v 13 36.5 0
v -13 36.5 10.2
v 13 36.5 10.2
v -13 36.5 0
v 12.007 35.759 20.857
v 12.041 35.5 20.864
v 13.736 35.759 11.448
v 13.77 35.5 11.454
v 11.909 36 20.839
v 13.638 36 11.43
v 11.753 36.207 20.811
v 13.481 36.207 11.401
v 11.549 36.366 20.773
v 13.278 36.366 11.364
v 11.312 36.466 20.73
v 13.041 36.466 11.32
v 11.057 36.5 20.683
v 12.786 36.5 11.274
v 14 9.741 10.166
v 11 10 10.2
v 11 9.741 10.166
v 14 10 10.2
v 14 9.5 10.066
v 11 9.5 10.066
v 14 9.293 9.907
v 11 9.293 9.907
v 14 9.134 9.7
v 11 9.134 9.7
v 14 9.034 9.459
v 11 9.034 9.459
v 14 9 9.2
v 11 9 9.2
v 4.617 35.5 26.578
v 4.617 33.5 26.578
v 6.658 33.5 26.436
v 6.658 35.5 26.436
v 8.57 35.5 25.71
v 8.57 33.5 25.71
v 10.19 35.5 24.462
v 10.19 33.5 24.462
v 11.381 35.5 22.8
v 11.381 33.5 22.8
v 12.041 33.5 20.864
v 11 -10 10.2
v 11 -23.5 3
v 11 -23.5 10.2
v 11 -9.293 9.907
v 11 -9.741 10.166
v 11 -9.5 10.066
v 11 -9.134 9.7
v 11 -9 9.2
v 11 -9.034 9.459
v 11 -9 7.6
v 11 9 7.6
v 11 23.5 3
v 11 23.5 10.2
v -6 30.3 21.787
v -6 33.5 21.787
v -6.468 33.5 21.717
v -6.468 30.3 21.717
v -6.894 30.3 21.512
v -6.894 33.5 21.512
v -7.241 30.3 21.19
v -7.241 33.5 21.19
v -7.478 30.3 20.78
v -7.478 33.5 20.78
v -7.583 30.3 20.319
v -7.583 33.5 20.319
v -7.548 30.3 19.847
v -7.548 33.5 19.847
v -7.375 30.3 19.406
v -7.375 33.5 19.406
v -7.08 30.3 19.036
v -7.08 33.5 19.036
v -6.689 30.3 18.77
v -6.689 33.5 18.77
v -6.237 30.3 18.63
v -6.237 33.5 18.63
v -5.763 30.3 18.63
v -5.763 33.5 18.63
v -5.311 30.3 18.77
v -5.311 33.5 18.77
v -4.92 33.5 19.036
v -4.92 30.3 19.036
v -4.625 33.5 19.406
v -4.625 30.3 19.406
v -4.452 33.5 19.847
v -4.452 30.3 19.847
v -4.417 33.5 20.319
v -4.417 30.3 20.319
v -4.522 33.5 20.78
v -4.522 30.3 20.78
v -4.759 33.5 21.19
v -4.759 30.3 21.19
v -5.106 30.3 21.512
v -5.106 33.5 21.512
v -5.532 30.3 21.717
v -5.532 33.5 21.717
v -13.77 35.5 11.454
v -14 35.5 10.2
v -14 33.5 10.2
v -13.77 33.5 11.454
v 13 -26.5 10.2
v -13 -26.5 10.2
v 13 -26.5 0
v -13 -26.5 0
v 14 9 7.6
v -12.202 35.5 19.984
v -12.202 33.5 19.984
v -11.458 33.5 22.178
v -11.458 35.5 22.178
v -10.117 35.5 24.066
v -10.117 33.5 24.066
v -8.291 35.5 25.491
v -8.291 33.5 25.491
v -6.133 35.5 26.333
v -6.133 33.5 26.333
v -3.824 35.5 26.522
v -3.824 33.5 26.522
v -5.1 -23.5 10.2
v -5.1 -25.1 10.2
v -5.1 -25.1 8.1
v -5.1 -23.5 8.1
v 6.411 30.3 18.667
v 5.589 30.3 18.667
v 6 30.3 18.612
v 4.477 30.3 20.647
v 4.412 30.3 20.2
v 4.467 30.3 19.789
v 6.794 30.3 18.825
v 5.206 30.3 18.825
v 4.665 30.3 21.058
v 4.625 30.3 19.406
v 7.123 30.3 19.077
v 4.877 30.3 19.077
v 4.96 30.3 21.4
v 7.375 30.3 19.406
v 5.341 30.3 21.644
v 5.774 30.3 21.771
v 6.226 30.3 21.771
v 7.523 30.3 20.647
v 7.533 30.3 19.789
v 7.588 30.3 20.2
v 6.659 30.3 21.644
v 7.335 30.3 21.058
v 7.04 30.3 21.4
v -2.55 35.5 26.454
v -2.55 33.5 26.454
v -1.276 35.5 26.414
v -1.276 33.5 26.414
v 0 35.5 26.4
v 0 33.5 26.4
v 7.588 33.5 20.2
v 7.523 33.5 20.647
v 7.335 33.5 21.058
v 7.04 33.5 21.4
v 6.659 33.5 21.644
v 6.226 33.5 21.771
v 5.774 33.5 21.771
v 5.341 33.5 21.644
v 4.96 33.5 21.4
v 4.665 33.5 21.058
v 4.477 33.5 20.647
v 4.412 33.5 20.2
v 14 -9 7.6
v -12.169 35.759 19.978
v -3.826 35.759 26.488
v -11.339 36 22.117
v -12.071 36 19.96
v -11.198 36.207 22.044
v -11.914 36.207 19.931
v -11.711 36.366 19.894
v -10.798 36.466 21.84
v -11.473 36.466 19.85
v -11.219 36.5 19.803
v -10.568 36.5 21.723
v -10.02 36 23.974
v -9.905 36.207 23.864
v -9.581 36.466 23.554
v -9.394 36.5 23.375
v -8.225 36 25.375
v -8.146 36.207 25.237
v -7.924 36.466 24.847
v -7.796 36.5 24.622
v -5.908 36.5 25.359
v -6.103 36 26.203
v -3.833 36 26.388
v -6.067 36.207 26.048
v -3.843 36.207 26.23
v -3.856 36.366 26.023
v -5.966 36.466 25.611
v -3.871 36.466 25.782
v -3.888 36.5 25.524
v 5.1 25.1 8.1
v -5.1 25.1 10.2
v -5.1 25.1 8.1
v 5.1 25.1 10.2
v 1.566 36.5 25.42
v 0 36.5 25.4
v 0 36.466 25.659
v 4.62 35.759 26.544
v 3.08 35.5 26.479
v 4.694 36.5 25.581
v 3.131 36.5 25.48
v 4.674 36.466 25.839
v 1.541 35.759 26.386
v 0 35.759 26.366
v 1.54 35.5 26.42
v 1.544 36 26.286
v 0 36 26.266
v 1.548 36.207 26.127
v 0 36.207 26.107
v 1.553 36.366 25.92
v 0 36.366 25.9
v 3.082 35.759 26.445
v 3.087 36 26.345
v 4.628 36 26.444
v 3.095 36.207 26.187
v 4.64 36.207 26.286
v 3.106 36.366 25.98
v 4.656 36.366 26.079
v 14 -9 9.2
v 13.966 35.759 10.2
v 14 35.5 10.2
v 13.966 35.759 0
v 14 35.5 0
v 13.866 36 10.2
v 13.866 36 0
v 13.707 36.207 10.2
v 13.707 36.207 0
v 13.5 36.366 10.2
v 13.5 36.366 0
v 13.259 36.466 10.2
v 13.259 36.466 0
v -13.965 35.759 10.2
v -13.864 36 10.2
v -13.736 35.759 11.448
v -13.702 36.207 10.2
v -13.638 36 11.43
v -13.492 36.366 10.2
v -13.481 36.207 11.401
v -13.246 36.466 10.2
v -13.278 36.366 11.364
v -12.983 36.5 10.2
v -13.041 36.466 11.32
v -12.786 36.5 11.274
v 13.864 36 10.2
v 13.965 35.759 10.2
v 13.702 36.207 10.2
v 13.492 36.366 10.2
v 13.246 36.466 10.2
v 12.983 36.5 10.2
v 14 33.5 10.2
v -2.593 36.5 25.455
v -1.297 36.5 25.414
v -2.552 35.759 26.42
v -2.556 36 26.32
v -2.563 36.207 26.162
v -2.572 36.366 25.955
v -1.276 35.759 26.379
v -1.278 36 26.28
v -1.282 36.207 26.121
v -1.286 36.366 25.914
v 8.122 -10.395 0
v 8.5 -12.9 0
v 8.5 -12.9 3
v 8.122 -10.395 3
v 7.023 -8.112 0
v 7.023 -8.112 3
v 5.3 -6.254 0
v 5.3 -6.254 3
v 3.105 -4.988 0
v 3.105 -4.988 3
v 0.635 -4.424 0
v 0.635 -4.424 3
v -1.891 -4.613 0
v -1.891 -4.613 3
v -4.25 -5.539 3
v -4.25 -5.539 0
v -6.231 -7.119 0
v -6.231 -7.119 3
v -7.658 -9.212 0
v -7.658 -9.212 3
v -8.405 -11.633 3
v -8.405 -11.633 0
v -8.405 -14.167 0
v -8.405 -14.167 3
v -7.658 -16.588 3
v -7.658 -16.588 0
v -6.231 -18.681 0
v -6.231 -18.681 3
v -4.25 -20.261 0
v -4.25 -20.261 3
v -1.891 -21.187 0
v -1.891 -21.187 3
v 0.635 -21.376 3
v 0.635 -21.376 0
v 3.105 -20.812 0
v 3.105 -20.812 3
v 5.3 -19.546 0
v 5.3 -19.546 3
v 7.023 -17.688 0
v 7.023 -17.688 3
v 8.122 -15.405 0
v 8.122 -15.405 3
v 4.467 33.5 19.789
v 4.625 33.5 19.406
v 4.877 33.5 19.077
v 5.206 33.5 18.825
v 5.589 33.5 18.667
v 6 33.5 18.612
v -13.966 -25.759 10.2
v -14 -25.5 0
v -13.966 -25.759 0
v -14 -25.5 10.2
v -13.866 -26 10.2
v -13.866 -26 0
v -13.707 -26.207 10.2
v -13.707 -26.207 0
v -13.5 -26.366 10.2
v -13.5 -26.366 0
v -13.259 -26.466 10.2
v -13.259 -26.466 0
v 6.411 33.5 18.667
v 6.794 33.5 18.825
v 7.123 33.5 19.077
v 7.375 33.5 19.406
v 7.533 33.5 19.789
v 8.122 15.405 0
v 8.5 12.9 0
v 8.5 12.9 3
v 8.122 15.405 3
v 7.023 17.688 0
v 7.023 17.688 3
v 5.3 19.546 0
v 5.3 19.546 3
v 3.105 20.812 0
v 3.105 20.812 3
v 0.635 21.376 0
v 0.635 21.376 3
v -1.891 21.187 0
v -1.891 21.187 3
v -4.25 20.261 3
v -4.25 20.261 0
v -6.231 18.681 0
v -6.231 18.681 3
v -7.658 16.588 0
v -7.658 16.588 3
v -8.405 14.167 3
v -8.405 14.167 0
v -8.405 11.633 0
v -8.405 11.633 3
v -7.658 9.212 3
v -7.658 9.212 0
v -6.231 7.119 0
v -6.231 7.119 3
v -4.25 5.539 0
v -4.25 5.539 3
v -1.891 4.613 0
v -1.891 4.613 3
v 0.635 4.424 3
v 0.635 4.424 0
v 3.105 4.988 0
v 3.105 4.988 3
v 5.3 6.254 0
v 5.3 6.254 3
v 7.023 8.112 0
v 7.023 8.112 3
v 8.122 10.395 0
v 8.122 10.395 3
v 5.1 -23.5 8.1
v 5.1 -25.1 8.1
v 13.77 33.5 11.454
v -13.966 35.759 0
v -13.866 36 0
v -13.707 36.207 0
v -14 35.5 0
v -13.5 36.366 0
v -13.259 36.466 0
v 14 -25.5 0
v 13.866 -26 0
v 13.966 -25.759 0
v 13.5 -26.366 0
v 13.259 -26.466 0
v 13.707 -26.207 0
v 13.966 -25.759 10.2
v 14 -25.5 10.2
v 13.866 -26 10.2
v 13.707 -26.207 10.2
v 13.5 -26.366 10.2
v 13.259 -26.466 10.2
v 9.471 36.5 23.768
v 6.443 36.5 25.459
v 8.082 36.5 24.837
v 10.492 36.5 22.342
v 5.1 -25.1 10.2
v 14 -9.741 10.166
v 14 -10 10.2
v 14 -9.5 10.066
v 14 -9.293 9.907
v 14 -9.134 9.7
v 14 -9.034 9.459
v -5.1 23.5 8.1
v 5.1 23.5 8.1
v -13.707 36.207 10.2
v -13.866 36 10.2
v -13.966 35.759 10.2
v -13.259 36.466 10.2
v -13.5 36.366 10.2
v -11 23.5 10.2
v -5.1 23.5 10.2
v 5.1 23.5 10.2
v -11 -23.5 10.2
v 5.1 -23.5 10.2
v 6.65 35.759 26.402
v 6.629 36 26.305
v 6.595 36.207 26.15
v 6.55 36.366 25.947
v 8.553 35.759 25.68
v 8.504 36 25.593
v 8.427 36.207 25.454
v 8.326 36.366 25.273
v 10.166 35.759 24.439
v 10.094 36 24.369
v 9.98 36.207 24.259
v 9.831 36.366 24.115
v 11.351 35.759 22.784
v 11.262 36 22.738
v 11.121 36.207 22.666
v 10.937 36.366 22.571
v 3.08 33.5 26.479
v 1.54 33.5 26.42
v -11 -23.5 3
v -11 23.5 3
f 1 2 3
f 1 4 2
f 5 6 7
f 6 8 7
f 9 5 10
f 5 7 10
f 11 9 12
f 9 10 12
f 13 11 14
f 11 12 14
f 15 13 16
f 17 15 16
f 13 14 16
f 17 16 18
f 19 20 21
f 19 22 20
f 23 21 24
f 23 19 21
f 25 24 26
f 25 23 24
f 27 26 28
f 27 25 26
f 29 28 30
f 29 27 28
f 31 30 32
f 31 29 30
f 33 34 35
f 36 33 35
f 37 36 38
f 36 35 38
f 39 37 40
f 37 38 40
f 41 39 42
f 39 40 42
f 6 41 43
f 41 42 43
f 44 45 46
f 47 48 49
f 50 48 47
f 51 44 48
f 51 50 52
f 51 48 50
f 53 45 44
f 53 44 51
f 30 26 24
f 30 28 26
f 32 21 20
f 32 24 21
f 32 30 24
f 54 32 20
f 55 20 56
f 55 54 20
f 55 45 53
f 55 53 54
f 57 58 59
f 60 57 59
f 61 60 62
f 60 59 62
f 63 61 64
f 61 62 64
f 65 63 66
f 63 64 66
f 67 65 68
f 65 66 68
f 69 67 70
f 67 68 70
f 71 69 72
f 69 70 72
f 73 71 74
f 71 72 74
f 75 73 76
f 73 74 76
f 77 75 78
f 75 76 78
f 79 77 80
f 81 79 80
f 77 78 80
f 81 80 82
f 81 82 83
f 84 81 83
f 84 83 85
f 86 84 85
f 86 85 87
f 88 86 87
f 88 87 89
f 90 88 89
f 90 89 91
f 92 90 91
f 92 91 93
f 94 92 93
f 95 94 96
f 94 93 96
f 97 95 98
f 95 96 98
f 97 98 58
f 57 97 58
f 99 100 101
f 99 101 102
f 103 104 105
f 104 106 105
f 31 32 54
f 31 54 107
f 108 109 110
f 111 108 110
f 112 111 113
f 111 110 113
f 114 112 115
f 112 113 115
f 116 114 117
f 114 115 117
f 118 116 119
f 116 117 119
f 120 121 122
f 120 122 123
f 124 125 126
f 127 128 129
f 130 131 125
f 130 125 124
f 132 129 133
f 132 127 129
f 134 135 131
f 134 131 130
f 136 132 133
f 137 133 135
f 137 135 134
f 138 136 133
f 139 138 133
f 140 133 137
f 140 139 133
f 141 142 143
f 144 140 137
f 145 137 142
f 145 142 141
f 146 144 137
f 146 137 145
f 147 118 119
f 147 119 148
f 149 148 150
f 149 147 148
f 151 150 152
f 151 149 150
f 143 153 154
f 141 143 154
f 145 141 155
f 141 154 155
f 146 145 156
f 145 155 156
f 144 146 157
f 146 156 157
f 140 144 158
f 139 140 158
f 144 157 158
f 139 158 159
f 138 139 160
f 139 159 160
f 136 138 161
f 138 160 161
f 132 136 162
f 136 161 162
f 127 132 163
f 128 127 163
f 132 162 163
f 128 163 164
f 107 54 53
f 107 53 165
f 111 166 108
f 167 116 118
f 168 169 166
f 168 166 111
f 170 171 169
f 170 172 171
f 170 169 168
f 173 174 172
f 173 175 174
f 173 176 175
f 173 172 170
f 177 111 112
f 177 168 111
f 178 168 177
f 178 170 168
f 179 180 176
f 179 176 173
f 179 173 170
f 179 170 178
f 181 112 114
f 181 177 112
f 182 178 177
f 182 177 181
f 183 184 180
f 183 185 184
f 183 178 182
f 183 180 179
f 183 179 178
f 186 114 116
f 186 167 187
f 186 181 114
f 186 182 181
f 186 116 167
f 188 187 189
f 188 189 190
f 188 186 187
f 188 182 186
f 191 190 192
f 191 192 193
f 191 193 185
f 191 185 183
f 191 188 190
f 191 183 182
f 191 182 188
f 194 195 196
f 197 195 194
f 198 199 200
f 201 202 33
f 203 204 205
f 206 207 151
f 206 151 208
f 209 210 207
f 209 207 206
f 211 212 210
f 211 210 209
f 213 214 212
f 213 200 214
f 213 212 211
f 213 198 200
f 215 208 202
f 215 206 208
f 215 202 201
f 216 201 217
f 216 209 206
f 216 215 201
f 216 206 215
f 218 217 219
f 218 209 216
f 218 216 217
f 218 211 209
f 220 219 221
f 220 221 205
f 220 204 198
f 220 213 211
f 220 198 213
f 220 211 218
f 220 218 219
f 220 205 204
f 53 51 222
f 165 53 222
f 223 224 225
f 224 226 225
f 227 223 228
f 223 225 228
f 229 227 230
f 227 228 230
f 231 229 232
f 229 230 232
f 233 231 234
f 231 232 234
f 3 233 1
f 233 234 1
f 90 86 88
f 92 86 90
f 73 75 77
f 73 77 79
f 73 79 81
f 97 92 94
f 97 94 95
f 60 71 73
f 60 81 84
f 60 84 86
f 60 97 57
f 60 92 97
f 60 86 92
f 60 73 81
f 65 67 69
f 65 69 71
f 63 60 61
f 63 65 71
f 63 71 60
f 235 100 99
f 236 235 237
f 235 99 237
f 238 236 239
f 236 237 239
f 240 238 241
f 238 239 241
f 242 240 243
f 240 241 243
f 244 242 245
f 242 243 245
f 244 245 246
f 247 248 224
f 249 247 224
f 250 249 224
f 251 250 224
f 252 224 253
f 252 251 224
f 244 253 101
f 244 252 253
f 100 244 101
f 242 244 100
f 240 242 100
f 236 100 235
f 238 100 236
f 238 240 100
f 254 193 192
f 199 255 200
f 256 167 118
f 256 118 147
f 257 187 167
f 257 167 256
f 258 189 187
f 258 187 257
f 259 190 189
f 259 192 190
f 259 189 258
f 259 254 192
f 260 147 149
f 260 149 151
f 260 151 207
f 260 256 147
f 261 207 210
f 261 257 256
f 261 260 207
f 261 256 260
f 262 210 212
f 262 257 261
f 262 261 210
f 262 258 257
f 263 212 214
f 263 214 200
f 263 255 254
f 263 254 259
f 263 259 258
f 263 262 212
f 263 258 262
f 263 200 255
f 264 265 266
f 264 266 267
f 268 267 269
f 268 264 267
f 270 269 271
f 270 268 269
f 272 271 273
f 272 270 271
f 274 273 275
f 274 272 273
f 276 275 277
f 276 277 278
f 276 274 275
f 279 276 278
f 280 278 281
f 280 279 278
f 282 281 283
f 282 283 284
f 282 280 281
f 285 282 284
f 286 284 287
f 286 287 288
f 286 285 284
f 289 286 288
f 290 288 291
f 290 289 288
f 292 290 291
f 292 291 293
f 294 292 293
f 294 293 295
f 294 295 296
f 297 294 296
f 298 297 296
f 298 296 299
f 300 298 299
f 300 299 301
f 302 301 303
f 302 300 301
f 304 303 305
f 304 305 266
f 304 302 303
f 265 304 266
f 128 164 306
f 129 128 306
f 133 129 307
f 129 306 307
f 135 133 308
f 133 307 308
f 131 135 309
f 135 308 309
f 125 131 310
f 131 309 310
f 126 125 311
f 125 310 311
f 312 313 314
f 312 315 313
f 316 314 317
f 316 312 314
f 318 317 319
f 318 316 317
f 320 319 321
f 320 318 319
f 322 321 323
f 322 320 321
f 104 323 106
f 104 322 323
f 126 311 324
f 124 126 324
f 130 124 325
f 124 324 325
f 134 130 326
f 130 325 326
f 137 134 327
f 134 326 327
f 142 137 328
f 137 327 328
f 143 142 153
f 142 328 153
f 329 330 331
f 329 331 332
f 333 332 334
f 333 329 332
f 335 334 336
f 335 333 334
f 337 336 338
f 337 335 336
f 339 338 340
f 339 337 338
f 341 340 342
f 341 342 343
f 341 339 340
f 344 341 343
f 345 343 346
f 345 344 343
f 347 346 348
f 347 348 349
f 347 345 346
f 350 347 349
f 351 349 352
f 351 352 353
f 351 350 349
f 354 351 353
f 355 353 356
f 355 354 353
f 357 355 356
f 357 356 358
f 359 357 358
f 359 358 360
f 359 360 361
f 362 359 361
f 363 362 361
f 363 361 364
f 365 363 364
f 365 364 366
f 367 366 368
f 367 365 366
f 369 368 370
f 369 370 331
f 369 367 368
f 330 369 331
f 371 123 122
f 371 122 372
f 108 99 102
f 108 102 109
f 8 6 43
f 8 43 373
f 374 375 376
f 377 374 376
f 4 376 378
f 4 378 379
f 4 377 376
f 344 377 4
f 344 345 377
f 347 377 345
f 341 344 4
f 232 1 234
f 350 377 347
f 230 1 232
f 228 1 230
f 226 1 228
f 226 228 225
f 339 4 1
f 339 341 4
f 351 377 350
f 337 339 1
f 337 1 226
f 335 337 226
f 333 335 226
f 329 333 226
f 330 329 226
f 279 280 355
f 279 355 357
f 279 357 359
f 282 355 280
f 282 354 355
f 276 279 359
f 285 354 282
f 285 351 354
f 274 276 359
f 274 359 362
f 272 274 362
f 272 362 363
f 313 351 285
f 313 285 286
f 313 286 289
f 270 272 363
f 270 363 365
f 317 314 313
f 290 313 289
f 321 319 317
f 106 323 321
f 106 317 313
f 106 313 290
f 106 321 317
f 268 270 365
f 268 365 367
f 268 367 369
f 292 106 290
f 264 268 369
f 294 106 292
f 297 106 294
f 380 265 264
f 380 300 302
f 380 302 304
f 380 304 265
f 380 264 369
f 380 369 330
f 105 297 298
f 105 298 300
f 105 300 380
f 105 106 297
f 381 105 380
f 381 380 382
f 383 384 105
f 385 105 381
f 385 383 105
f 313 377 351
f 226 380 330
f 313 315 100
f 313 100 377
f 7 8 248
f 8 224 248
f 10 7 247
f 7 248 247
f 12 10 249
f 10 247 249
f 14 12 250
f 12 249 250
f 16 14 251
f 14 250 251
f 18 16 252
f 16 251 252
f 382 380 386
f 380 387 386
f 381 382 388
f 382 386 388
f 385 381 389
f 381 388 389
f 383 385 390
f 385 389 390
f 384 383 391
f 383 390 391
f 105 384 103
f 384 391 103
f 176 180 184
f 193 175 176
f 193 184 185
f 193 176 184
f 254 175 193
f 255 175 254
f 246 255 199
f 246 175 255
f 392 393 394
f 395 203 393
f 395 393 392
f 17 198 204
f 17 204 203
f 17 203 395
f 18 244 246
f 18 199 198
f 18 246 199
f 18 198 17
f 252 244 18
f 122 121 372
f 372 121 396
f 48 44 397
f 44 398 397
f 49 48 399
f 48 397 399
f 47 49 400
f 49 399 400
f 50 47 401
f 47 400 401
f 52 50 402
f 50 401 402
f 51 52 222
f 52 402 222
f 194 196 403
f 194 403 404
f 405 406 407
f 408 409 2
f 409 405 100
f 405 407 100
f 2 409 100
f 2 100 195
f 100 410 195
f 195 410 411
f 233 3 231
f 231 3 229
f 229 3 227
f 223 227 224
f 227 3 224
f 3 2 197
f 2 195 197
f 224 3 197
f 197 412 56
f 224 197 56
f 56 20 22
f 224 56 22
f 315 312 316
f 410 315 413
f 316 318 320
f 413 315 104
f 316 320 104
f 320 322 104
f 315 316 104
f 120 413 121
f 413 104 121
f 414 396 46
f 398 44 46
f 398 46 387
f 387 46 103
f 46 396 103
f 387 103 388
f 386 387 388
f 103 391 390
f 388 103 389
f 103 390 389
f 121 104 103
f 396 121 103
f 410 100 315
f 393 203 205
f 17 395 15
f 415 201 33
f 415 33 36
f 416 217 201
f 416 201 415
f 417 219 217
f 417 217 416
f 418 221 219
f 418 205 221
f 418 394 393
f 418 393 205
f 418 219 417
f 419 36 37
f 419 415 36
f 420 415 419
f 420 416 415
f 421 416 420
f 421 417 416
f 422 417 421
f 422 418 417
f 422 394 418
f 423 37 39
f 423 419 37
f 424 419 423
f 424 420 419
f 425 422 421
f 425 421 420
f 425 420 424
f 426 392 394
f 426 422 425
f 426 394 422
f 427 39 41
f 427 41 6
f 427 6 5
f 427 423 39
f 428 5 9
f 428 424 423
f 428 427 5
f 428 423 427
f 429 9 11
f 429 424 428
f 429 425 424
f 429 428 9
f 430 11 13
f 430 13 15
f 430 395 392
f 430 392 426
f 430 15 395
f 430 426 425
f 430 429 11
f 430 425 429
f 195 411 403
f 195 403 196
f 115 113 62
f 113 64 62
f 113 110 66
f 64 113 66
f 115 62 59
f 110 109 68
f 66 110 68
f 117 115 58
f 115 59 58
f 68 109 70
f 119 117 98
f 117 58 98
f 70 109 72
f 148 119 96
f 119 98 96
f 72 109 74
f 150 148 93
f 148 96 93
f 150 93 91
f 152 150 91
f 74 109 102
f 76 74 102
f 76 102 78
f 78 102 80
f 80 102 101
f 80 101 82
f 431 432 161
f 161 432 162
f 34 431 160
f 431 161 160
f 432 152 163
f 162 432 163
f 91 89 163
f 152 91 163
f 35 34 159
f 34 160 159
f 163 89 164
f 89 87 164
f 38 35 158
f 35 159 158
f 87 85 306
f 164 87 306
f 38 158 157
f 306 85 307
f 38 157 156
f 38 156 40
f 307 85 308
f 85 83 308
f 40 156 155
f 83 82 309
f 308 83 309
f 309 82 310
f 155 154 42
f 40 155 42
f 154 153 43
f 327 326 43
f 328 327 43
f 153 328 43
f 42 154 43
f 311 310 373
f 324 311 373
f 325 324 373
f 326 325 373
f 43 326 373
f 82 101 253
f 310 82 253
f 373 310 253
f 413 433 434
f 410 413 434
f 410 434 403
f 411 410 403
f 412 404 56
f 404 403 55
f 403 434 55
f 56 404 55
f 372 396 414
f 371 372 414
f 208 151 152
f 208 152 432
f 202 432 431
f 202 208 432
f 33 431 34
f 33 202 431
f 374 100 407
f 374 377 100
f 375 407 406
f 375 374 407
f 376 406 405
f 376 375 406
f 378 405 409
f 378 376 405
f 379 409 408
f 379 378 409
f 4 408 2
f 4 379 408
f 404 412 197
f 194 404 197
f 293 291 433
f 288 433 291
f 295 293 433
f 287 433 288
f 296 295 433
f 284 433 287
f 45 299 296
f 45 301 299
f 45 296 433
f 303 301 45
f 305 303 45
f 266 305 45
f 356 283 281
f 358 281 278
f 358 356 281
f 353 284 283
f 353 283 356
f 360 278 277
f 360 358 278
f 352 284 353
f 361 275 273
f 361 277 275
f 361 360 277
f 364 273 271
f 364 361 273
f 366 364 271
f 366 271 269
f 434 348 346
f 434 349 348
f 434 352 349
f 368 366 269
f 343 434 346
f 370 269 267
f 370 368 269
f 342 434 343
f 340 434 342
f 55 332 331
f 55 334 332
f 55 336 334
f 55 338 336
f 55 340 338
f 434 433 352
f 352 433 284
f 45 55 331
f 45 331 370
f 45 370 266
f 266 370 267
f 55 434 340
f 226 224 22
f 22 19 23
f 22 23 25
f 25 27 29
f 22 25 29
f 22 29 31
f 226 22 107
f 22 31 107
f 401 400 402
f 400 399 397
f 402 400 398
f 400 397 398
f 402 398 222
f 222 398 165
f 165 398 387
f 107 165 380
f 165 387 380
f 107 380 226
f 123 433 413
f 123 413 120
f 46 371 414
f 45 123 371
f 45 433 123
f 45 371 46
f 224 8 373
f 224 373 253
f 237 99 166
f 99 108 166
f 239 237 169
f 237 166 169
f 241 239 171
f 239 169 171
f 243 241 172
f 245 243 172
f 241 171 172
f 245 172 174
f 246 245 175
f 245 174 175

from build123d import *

# Parameters (mm, degrees)
SKETCH2_W           = 28
SKETCH2_H           = 53
SKETCH2_W_2         = 22
SKETCH2_H_2         = 47
SKETCH2_R           = 8.5
BOSS_EXTRUDE1_DEPTH = 3
SKETCH3_W           = 28
SKETCH3_H           = 53
SKETCH3_W_2         = 22
SKETCH3_H_2         = 47
EXTRUDE_THIN1_DEPTH = 7.2
SKETCH4_W           = 6
SKETCH4_H           = 18
CUT_EXTRUDE1_DEPTH  = 2.6
SKETCH5_W           = 10.2
SKETCH5_H           = 1.6
CUT_EXTRUDE2_DEPTH  = 2.1
SKETCH6_W           = 28
SKETCH6_H           = 10.2
BOSS_EXTRUDE2_DEPTH = 10
SKETCH7_R           = 1.5875
BOSS_EXTRUDE3_DEPTH = 3
SKETCH8_R           = 1.5875
BOSS_EXTRUDE4_DEPTH = 3.2
FILLET1_R           = 8
FILLET2_R           = 7
FILLET3_R           = 1
FILLET4_R           = 1


with BuildPart() as part:
    # Sketch2 → Boss-Extrude1 (new body)
    # profile 1 of 2: a face of its own
    with BuildSketch(Plane.XY):
        Rectangle(SKETCH2_W, SKETCH2_H)
        Rectangle(SKETCH2_W_2, SKETCH2_H_2, mode=Mode.SUBTRACT)
    # profile 2 of 2: a face of its own
    with BuildSketch(Plane.XY):
        Rectangle(SKETCH2_W_2, SKETCH2_H_2)
        with Locations((0, 12.9)):
            Circle(SKETCH2_R, mode=Mode.SUBTRACT)
        with Locations((0, -12.9)):
            Circle(SKETCH2_R, mode=Mode.SUBTRACT)
    extrude(amount=BOSS_EXTRUDE1_DEPTH)

    # Sketch3 → Extrude-Thin1 (add)
    with BuildSketch(Plane.XY.offset(3)):
        Rectangle(SKETCH3_W, SKETCH3_H)
        Rectangle(SKETCH3_W_2, SKETCH3_H_2, mode=Mode.SUBTRACT)
    extrude(amount=EXTRUDE_THIN1_DEPTH)

    # Sketch4 → Cut-Extrude1 (cut)
    with BuildSketch(Plane.XY.offset(10.2)):
        with Locations((11, 0)):
            Rectangle(SKETCH4_W, SKETCH4_H)
    extrude(amount=-CUT_EXTRUDE1_DEPTH, mode=Mode.SUBTRACT)

    # Sketch5 → Cut-Extrude2 (cut)
    with BuildSketch(Plane.XY.offset(10.2)):
        with Locations((0, 24.3)):
            Rectangle(SKETCH5_W, SKETCH5_H)
        with Locations((0, -24.3)):
            Rectangle(SKETCH5_W, SKETCH5_H)
    extrude(amount=-CUT_EXTRUDE2_DEPTH, mode=Mode.SUBTRACT)

    # Sketch6 → Boss-Extrude2 (add)
    with BuildSketch(Plane(origin=(0, 26.5, 0), x_dir=(1, 0, 0), z_dir=(0, 1, 0))):
        with Locations((0, -5.1)):
            Rectangle(SKETCH6_W, SKETCH6_H)
    extrude(amount=BOSS_EXTRUDE2_DEPTH)

    # Fillet4
    fillet4_edges = [part.edges().sort_by_distance(p)[0] for p in [
        (-14, -26.5, 5.1),
        (14, -26.5, 5.1),
        (12.5, 9, 10.2),
        (12.5, -9, 10.2),
        (-14, 36.5, 5.1),
        (14, 36.5, 5.1),
    ]]
    fillet(fillet4_edges, radius=FILLET4_R)


with BuildPart() as body_2:
    # Sketch7 → Boss-Extrude3 (new body)
    # profile 1 of 11: a face of its own
    with BuildSketch(Plane(origin=(0, 36.5, 0), x_dir=(1, 0, 0), z_dir=(0, 1, 0))):
        with BuildLine():
            ThreePointArc((-13.769529259, -11.454419317), (-6.913275343, -10.514252827), (0, -10.2))
            Line((0, -10.2), (-14, -10.2))
            Line((-14, -10.2), (-13.769529259, -11.454419317))
        make_face()
    # profile 2 of 11: a face of its own
    with BuildSketch(Plane(origin=(0, 36.5, 0), x_dir=(1, 0, 0), z_dir=(0, 1, 0))):
        with BuildLine():
            Line((0, -20.2), (0, -10.2))
            ThreePointArc((0, -10.2), (-6.913275343, -10.514252827), (-13.769529259, -11.454419317))
            Line((-13.769529259, -11.454419317), (-10.842149023, -27.387731745))
            ThreePointArc((-10.842149023, -27.387731745), (-5.443523892, -26.647443171), (0, -26.4))
            Line((0, -26.4), (0, -20.2))
        make_face()
        with Locations((-6, -20.2)):
            Circle(SKETCH7_R, mode=Mode.SUBTRACT)
    # profile 3 of 11: a face of its own
    with BuildSketch(Plane(origin=(0, 36.5, 0), x_dir=(1, 0, 0), z_dir=(0, 1, 0))):
        with BuildLine():
            Line((4.4125, -20.2), (0, -20.2))
            Line((0, -20.2), (0, -26.4))
            ThreePointArc((0, -26.4), (5.443523892, -26.647443171), (10.842149023, -27.387731745))
            Line((10.842149023, -27.387731745), (13.769529259, -11.454419317))
            ThreePointArc((13.769529259, -11.454419317), (9.89785669, -10.845566424), (6, -10.436587754))
            Line((6, -10.436587754), (6, -18.6125))
            ThreePointArc((6, -18.6125), (7.122532015, -19.077467985), (7.5875, -20.2))
            ThreePointArc((7.5875, -20.2), (6, -21.7875), (4.4125, -20.2))
        make_face()
    # profile 4 of 11: a face of its own
    with BuildSketch(Plane(origin=(0, 36.5, 0), x_dir=(1, 0, 0), z_dir=(0, 1, 0))):
        with BuildLine():
            Line((14, -10.2), (6, -10.2))
            Line((6, -10.2), (6, -10.436587754))
            ThreePointArc((6, -10.436587754), (9.89785669, -10.845566424), (13.769529259, -11.454419317))
            Line((13.769529259, -11.454419317), (14, -10.2))
        make_face()
    # profile 5 of 11: a face of its own
    with BuildSketch(Plane(origin=(0, 36.5, 0), x_dir=(1, 0, 0), z_dir=(0, 1, 0))):
        with BuildLine():
            ThreePointArc((6, -10.436587754), (3.002331334, -10.259169912), (0, -10.2))
            Line((0, -10.2), (0, -20.2))
            Line((0, -20.2), (4.4125, -20.2))
            ThreePointArc((4.4125, -20.2), (4.877467985, -19.077467985), (6, -18.6125))
            Line((6, -18.6125), (6, -10.436587754))
        make_face()
    # profile 6 of 11: a face of its own
    with BuildSketch(Plane(origin=(0, 36.5, 0), x_dir=(1, 0, 0), z_dir=(0, 1, 0))):
        with Locations((-6, -20.2)):
            Circle(SKETCH7_R)
    # profile 7 of 11: a face of its own
    with BuildSketch(Plane(origin=(0, 36.5, 0), x_dir=(1, 0, 0), z_dir=(0, 1, 0))):
        with BuildLine():
            ThreePointArc((6, -18.6125), (4.877467985, -19.077467985), (4.4125, -20.2))
            Line((4.4125, -20.2), (6, -20.2))
            Line((6, -20.2), (6, -18.6125))
        make_face()
    # profile 8 of 11: a face of its own
    with BuildSketch(Plane(origin=(0, 36.5, 0), x_dir=(1, 0, 0), z_dir=(0, 1, 0))):
        with BuildLine():
            Line((6, -20.2), (4.4125, -20.2))
            ThreePointArc((4.4125, -20.2), (6, -21.7875), (7.5875, -20.2))
            ThreePointArc((7.5875, -20.2), (7.122532015, -19.077467985), (6, -18.6125))
            Line((6, -18.6125), (6, -20.2))
        make_face()
    # profile 9 of 11: a face of its own
    with BuildSketch(Plane(origin=(0, 36.5, 0), x_dir=(1, 0, 0), z_dir=(0, 1, 0))):
        with BuildLine():
            ThreePointArc((6, -18.6125), (4.877467985, -19.077467985), (4.4125, -20.2))
            Line((4.4125, -20.2), (6, -20.2))
            Line((6, -20.2), (6, -18.6125))
        make_face()
    # profile 10 of 11: a face of its own
    with BuildSketch(Plane(origin=(0, 36.5, 0), x_dir=(1, 0, 0), z_dir=(0, 1, 0))):
        with BuildLine():
            Line((6, -20.2), (4.4125, -20.2))
            ThreePointArc((4.4125, -20.2), (6, -21.7875), (7.5875, -20.2))
            ThreePointArc((7.5875, -20.2), (7.122532015, -19.077467985), (6, -18.6125))
            Line((6, -18.6125), (6, -20.2))
        make_face()
    # profile 11 of 11: a face of its own
    with BuildSketch(Plane(origin=(0, 36.5, 0), x_dir=(1, 0, 0), z_dir=(0, 1, 0))):
        with BuildLine():
            Line((6, -10.2), (0, -10.2))
            ThreePointArc((0, -10.2), (3.002331334, -10.259169912), (6, -10.436587754))
            Line((6, -10.436587754), (6, -10.2))
        make_face()
    extrude(amount=-BOSS_EXTRUDE3_DEPTH)

    # Sketch8 → Boss-Extrude4 (add)
    with BuildSketch(Plane.XZ.offset(-33.5)):
        with Locations(Location((-6, 20.2, 0), (0, 0, 90))):
            Circle(SKETCH8_R)
        with BuildLine():
            ThreePointArc((4.4125, 20.2), (4.877467985, 19.077467985), (6, 18.6125))
            Line((6, 18.6125), (6, 20.2))
            Line((6, 20.2), (4.4125, 20.2))
        make_face()
        with BuildLine():
            Line((6, 20.2), (6, 18.6125))
            ThreePointArc((6, 18.6125), (7.122532015, 19.077467985), (7.5875, 20.2))
            ThreePointArc((7.5875, 20.2), (6, 21.7875), (4.4125, 20.2))
            Line((4.4125, 20.2), (6, 20.2))
        make_face()
        with BuildLine():
            ThreePointArc((4.4125, 20.2), (4.877467985, 19.077467985), (6, 18.6125))
            Line((6, 18.6125), (6, 20.2))
            Line((6, 20.2), (4.4125, 20.2))
        make_face()
        with BuildLine():
            Line((6, 20.2), (6, 18.6125))
            ThreePointArc((6, 18.6125), (7.122532015, 19.077467985), (7.5875, 20.2))
            ThreePointArc((7.5875, 20.2), (6, 21.7875), (4.4125, 20.2))
            Line((4.4125, 20.2), (6, 20.2))
        make_face()
    extrude(amount=BOSS_EXTRUDE4_DEPTH)

    # Fillet1
    fillet1_edges = [body_2.edges().sort_by_distance(p)[0] for p in [
        (-10.842149023, 35, 27.387731745),
    ]]
    fillet(fillet1_edges, radius=FILLET1_R)

    # Fillet2
    fillet2_edges = [body_2.edges().sort_by_distance(p)[0] for p in [
        (10.842149023, 35, 27.387731745),
    ]]
    fillet(fillet2_edges, radius=FILLET2_R)

    # Fillet3
    fillet3_edges = [body_2.edges().sort_by_distance(p)[0] for p in [
        (-9.255846997, 36.5, 24.845143696),
        (0.397542937, 36.5, 26.401317018),
        (13.020403663, 36.5, 15.531802922),
        (9.425883158, 36.5, 25.145621163),
        (-13.101218066, 36.5, 15.091941669),
    ]]
    fillet(fillet3_edges, radius=FILLET3_R)


solid = Compound([part.part, body_2.part])
